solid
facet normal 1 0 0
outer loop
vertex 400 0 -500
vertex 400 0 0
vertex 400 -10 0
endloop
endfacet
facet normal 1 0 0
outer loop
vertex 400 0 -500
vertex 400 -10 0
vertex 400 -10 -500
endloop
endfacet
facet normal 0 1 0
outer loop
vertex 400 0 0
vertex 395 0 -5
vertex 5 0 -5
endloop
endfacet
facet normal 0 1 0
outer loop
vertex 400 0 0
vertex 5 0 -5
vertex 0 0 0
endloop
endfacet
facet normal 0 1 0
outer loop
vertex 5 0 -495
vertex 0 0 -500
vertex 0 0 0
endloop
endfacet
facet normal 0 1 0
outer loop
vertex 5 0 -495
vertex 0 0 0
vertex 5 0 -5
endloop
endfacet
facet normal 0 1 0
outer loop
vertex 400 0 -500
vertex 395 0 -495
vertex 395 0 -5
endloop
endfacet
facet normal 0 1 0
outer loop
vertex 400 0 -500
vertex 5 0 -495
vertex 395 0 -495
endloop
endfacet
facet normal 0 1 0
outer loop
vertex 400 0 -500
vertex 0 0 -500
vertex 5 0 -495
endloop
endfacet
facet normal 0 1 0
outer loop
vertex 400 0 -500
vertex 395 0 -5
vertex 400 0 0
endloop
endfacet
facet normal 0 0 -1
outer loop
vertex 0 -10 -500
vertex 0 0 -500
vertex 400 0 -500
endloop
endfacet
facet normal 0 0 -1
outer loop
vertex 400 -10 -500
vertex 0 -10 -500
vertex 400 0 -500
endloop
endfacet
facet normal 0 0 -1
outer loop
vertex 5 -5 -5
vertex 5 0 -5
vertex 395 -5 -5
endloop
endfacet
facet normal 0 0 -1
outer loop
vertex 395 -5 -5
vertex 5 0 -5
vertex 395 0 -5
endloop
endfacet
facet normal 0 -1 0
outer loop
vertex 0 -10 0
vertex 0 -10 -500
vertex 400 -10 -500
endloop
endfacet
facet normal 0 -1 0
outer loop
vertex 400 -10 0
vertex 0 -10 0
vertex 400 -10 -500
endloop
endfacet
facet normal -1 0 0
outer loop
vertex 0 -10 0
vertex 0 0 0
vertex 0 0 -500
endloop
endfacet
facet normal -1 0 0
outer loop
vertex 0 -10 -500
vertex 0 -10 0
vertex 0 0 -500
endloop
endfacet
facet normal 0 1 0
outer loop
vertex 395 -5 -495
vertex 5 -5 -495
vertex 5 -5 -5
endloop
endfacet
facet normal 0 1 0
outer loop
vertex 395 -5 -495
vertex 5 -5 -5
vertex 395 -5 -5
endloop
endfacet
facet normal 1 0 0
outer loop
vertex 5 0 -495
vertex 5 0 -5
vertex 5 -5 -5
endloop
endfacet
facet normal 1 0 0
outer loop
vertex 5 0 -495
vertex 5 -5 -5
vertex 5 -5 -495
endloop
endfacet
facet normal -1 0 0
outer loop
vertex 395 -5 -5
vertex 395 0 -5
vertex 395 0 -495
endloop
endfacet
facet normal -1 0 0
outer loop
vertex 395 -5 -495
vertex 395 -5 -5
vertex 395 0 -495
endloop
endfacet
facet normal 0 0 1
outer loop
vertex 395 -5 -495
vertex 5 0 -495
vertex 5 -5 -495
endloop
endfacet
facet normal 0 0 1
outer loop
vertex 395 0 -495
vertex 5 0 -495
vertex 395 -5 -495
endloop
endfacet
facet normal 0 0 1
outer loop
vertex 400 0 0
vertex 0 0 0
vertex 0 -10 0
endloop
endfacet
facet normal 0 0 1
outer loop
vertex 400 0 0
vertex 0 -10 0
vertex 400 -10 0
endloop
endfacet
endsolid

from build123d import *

# Parameters (mm, degrees)
SKETCH1_W      = 400
SKETCH1_H      = 500
EXTRUDE1_DEPTH = 10
SHELL1_T       = -5


with BuildPart() as part:
    # Sketch1 → Extrude1 (new body)
    with BuildSketch(Plane(origin=(0, 0, 0), x_dir=(1, 0, 0), z_dir=(0, 1, 0))):
        with Locations((200, 250)):
            Rectangle(SKETCH1_W, SKETCH1_H)
    extrude(amount=-EXTRUDE1_DEPTH)

    # Shell1
    shell1_openings = [part.faces().sort_by_distance(p)[0] for p in [
        (200, 0, -250),
    ]]
    offset(amount=SHELL1_T, openings=shell1_openings, kind=Kind.INTERSECTION)


solid = part.part
